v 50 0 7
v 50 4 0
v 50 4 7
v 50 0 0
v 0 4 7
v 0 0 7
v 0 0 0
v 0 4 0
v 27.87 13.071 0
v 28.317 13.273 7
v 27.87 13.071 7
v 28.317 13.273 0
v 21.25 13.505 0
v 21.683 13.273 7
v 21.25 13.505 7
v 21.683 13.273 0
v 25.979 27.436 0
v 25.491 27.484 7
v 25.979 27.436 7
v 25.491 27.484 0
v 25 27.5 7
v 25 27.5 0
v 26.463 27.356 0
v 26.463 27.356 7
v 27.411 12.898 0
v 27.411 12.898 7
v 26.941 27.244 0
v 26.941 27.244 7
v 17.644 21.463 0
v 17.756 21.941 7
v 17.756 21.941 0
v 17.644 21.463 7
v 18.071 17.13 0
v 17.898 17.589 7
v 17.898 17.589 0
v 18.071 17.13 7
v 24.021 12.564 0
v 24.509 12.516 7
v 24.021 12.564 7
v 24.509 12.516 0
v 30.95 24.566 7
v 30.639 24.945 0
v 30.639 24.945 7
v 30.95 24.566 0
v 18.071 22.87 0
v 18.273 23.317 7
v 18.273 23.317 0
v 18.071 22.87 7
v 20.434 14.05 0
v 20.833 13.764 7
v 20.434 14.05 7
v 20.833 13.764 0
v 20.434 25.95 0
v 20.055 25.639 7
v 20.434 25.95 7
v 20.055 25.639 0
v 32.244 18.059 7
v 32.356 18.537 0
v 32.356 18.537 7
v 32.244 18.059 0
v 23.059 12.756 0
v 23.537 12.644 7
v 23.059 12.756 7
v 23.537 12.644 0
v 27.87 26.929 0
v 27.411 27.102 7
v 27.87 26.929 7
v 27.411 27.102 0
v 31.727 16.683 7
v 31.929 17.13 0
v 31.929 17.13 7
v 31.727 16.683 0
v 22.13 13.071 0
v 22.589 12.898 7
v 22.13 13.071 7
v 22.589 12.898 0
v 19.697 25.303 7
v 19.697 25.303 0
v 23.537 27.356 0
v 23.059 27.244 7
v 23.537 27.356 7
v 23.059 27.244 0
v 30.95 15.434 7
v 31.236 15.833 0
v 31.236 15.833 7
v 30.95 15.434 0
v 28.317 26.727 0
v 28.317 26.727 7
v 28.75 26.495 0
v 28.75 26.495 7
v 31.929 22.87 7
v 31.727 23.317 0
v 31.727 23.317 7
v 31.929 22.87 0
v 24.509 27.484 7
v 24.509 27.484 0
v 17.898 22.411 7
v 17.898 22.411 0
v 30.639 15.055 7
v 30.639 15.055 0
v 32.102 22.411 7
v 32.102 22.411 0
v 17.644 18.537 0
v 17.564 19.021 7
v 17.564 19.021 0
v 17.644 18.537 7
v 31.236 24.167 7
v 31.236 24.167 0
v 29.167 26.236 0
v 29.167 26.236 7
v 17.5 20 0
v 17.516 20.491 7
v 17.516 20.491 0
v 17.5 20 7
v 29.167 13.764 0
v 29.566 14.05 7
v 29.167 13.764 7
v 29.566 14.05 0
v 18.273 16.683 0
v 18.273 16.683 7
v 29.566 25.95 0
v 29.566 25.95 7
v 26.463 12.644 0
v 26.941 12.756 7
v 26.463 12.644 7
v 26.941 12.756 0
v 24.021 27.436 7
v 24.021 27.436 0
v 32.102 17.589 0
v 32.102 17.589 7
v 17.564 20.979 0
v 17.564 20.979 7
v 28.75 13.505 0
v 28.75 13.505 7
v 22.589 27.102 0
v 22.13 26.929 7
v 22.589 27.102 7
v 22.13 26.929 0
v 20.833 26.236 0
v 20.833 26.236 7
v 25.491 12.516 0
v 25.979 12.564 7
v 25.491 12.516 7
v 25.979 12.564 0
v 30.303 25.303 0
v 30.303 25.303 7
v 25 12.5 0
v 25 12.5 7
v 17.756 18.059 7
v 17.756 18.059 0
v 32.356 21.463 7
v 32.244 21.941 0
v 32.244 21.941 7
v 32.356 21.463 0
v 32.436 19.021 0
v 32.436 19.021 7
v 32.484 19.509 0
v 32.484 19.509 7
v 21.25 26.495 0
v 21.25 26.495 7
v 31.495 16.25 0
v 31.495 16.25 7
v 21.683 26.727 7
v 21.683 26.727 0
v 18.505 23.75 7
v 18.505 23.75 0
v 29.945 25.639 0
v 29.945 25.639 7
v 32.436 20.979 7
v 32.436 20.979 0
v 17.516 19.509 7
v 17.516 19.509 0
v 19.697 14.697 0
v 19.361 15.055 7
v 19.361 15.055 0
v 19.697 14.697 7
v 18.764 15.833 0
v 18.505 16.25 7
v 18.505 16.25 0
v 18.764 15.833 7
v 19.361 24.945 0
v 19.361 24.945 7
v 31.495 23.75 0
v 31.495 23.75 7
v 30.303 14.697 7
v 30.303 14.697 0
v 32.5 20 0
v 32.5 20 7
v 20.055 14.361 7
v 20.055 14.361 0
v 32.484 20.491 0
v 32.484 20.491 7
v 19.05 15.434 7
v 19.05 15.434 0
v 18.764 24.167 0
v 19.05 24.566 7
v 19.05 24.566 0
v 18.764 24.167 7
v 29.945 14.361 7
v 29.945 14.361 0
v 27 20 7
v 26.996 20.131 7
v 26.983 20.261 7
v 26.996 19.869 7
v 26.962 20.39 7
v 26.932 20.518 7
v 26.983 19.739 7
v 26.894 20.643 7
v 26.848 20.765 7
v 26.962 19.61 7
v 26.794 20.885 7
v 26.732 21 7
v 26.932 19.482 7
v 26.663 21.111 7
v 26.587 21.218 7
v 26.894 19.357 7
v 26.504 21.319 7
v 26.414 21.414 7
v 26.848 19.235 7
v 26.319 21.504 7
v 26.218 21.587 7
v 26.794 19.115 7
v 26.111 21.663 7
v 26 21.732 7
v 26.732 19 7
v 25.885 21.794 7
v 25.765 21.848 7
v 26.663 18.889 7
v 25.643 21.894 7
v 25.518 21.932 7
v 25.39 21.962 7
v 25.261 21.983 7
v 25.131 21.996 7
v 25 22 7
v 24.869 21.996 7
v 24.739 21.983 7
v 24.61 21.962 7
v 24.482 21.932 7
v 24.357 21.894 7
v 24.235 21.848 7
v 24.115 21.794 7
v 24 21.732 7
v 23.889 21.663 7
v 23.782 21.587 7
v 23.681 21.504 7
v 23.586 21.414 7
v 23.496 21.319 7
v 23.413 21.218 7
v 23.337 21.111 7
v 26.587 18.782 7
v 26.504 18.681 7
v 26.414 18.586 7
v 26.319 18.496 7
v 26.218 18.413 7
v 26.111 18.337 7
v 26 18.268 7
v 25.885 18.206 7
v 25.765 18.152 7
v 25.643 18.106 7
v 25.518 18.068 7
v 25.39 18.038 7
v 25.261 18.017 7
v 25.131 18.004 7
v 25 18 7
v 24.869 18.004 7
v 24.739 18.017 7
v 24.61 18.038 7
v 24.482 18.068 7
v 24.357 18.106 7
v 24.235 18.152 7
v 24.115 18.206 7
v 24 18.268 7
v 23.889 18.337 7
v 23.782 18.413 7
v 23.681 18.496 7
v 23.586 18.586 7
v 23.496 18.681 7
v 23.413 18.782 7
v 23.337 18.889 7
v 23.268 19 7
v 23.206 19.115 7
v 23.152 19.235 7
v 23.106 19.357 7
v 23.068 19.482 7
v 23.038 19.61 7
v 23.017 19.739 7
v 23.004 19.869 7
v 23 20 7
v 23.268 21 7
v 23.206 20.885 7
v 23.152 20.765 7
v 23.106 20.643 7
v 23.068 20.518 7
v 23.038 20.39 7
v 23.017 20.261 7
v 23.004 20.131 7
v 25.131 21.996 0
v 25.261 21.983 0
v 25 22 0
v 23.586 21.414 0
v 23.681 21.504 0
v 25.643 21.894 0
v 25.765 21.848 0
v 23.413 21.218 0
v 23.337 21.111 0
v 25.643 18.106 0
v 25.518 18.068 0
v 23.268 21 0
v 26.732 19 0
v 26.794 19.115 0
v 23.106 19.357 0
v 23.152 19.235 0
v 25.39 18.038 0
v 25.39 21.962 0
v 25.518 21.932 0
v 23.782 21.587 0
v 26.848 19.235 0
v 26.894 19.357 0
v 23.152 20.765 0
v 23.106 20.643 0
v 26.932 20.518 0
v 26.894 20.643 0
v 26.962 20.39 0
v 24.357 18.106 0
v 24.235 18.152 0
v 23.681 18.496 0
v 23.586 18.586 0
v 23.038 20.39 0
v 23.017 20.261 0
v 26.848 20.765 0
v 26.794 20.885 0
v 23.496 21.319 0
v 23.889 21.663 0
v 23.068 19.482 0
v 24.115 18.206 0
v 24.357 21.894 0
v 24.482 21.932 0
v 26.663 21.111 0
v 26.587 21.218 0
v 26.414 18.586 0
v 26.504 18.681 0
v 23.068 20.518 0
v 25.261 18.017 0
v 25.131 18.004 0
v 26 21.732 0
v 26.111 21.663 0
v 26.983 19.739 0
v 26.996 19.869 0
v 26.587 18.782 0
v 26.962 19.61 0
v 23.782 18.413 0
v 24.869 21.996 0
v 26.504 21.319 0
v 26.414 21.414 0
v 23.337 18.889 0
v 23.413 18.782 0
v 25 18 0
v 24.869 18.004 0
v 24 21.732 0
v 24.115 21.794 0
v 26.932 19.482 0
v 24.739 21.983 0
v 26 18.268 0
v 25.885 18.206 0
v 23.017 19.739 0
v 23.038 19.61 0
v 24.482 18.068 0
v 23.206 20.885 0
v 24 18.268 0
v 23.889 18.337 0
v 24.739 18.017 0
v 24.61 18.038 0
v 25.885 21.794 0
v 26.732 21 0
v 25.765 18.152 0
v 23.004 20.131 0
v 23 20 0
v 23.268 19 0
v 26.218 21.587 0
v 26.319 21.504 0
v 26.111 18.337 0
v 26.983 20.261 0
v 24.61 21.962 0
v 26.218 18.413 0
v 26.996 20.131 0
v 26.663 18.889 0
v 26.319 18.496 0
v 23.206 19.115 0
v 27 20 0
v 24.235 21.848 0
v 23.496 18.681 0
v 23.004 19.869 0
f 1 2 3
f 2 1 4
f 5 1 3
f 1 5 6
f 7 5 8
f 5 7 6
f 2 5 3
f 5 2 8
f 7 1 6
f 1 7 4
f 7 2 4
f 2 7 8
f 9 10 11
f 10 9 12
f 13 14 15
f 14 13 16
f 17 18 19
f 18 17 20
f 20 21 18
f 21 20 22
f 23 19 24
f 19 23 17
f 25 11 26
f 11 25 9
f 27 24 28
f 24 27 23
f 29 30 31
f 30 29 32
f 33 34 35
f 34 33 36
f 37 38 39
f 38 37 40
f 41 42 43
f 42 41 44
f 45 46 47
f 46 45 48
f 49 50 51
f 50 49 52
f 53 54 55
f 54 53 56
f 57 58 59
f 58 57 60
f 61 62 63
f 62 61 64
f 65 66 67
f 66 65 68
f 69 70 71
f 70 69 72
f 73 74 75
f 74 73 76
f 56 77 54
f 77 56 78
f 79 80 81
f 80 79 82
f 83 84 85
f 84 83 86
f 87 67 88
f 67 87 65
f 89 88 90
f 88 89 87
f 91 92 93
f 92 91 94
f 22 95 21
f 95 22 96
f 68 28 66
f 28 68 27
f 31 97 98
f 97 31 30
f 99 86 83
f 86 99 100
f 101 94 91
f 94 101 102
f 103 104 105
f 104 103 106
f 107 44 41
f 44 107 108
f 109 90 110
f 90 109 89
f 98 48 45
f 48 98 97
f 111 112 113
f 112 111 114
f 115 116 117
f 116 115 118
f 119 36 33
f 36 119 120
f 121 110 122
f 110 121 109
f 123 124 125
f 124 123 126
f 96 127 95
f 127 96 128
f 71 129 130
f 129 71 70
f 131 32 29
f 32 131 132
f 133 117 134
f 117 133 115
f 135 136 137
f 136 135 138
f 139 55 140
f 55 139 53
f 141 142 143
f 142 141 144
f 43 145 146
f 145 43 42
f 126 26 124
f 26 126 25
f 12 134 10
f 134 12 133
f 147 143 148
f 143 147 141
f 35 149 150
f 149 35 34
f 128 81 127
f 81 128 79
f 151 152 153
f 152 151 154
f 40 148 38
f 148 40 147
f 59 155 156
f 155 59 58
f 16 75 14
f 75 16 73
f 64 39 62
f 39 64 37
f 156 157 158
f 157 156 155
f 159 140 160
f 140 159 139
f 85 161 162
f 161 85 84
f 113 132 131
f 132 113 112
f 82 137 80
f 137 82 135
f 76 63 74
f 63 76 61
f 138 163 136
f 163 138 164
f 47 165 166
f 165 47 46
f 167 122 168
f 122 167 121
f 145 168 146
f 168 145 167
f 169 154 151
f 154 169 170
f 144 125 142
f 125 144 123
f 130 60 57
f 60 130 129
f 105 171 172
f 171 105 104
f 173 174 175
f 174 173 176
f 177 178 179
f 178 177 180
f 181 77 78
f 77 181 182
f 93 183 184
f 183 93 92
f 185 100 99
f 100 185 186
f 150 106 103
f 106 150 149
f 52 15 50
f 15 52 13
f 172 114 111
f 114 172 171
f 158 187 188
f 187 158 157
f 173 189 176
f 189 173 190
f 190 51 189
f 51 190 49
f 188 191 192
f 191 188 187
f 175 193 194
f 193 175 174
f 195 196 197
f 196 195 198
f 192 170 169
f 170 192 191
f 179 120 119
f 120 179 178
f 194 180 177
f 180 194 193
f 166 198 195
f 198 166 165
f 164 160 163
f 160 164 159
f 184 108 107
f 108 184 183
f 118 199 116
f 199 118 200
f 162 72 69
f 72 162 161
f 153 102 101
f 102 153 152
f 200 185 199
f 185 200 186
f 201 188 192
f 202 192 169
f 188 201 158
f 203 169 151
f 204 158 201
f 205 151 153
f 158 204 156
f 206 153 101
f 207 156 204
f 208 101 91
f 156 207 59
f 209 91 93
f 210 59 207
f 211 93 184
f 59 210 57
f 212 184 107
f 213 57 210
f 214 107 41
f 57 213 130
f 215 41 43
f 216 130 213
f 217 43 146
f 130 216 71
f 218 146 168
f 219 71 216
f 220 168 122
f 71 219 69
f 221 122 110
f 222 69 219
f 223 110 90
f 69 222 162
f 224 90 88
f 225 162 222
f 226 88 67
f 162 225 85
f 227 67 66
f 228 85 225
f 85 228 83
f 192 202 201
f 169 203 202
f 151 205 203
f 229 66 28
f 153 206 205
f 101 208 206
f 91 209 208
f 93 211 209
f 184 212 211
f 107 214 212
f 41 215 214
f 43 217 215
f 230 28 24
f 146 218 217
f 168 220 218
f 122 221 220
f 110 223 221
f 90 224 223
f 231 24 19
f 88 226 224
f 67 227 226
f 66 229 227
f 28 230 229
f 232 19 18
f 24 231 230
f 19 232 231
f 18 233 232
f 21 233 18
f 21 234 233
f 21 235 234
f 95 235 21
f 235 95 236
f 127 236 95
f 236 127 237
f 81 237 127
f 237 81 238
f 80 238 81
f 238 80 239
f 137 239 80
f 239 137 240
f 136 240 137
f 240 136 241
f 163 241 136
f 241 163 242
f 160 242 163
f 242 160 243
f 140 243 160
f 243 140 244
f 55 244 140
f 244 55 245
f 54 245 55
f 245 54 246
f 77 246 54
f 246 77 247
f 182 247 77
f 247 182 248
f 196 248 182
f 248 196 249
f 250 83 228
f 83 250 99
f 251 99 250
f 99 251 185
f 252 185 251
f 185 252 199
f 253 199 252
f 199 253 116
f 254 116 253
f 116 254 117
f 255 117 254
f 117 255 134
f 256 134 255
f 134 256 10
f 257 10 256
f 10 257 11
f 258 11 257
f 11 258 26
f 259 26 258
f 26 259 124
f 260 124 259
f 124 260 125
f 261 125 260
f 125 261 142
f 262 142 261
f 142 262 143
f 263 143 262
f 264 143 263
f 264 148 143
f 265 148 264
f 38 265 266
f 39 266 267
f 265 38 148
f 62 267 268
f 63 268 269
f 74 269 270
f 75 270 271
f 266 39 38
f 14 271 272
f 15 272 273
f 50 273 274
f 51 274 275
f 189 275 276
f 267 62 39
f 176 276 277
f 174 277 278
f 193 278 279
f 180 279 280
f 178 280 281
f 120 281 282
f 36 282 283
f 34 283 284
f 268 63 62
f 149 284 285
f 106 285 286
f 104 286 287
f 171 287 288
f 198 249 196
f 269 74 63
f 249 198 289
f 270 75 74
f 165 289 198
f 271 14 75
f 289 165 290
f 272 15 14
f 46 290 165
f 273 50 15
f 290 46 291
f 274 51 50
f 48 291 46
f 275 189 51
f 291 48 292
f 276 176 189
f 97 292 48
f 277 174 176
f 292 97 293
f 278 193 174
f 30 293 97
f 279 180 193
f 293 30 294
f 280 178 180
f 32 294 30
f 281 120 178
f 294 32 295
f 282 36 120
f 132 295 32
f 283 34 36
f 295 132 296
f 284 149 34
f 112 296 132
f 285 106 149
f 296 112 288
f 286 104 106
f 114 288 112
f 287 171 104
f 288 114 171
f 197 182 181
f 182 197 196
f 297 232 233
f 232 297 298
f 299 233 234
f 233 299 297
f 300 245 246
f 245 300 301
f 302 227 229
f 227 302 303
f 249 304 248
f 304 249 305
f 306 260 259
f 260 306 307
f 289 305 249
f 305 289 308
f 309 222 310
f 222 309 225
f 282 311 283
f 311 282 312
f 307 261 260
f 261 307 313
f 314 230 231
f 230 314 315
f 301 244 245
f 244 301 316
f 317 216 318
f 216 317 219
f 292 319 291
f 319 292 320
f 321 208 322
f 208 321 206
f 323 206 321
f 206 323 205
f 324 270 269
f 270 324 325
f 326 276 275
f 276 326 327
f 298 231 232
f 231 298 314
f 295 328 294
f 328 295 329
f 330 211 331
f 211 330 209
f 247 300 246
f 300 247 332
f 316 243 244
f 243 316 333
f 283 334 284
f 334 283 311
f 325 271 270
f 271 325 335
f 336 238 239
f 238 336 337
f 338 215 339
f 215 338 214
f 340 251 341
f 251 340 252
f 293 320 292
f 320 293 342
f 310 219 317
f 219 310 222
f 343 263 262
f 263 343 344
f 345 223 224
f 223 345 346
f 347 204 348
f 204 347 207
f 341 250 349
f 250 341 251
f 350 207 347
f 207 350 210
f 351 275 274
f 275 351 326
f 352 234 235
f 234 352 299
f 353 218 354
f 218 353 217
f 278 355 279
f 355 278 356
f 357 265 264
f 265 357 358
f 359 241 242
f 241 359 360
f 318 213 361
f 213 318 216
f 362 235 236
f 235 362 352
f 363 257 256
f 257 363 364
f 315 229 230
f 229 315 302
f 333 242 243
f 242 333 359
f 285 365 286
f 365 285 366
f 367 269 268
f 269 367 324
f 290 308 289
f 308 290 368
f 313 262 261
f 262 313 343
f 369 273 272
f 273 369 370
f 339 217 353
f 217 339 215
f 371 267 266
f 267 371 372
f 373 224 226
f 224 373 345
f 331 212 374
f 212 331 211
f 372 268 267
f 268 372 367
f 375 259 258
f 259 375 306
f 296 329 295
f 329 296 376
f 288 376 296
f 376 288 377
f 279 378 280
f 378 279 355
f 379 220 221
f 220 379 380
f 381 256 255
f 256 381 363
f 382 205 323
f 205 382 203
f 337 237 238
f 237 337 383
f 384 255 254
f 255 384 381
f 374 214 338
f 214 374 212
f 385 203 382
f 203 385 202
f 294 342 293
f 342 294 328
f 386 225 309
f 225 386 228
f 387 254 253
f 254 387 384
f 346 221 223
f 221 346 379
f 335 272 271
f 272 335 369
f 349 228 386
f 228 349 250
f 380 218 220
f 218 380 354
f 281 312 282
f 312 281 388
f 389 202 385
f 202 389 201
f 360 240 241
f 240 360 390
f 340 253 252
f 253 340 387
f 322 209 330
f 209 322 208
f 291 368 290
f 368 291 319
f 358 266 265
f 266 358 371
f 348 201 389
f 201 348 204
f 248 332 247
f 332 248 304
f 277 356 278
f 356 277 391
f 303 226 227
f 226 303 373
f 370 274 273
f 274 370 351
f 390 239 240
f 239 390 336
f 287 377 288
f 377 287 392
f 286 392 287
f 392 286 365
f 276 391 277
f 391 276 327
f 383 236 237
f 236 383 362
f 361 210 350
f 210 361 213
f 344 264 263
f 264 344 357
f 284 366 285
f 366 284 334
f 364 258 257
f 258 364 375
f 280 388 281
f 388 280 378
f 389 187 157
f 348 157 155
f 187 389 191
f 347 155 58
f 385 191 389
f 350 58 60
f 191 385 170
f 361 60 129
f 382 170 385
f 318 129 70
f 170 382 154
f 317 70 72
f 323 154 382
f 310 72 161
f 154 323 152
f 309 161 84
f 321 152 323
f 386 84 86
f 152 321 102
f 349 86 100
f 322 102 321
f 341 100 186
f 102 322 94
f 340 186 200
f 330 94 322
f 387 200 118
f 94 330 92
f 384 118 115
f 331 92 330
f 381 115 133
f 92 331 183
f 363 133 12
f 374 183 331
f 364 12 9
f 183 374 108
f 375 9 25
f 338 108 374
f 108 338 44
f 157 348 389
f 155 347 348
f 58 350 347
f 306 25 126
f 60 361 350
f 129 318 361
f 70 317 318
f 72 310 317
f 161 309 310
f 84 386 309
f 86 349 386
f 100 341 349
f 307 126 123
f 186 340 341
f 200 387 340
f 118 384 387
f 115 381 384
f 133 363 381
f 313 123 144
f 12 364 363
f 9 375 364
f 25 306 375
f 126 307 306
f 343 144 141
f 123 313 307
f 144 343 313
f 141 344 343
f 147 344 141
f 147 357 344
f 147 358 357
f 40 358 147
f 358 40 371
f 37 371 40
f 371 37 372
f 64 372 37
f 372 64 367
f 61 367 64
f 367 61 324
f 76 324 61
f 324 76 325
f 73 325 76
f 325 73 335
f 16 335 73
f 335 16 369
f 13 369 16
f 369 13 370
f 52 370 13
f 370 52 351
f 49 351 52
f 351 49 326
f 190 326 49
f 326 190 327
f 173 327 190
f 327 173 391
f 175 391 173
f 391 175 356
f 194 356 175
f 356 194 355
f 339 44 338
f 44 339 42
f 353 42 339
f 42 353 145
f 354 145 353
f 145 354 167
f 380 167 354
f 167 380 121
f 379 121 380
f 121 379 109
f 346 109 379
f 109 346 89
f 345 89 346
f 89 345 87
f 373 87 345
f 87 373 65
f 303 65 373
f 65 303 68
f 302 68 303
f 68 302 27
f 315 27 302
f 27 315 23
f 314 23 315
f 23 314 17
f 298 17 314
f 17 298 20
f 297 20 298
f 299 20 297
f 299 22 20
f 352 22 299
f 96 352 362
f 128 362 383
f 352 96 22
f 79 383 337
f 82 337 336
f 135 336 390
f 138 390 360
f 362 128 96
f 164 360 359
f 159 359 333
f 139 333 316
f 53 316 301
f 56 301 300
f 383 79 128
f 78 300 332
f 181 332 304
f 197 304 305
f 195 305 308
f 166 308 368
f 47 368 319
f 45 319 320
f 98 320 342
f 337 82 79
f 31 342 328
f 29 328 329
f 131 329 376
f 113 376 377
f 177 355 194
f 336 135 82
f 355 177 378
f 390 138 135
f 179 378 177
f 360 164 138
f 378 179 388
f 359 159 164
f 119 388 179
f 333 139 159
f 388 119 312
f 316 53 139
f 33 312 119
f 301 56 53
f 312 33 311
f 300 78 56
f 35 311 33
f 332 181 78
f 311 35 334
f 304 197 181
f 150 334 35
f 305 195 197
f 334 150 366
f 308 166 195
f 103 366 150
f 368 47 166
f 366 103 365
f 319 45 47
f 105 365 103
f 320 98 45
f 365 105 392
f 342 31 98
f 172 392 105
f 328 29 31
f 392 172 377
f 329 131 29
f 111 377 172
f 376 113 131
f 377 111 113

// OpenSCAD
// based on work of janssen86
// http://www.thingiverse.com/thing:2072364
// Zahnstange mit Ritzel / Gear Rack and Pinion by janssen86 is licensed under the Creative Commons - Attribution - Non-Commercial - Share Alike license.
// https://creativecommons.org/licenses/by-nc-sa/3.0/

// Fake gears draw a solid rectangular prism and cylinder with axial hole, up to the pitch level, for ease of layout.
$fakeGears = true; 
herringbone = 1;
materialSavingInset = 0;
removeCircles = 0;
// Kopfspiel (pinion play)
spiel = 0.05;
// Höhe des Zahnkopfes über dem Teilkreis (height of the tooth above the pitch line)
modul=1;
// Laenge der Zahnstange
laenge_stange=50;
// Anzahl der Radzähne (number of pinion teeth)
zahnzahl_ritzel=15;
// Höhe der Zahnstange bis zur Wälzgeraden (height from bottom to the pitch line)
hoehe_stange=4; 
// Durchmesser der Mittelbohrung des Stirnrads (axial hole diameter)
bohrung_ritzel=4;
// Breite der Zähne (face width)
breite=7;
// Eingriffswinkel, Standardwert = 20° gemäß DIN 867. Sollte nicht größer als 45° sein.
eingriffswinkel=20;
// Schrägungswinkel zur Rotationsachse, Standardwert = 0° (Geradverzahnung)
schraegungswinkel=20;
// Komponenten zusammengebaut für Konstruktion oder auseinander zum 3D-Druck 
zusammen_gebaut=0;
// Löcher zur Material-/Gewichtsersparnis bzw. Oberflächenvergößerung erzeugen, wenn Geometrie erlaubt
optimiert = 1;

/* Bibliothek für ein Zahstangen-Radpaar für Thingiverse Customizer

Enthält die Module
zahnstange(modul, laenge, hoehe, breite, eingriffswinkel = 20, schraegungswinkel = 0)
stirnrad(modul, zahnzahl, breite, bohrung, eingriffswinkel = 20, schraegungswinkel = 0, optimiert = true)
zahnstange_und_ritzel (modul, laenge_stange, zahnzahl_ritzel, hoehe_stange, bohrung_ritzel, breite, eingriffswinkel=20, schraegungswinkel=0, zusammen_gebaut=true, optimiert=true)

Autor:		Dr Jörg Janssen
Stand:		6. Januar 2017
Version:	2.0
Lizenz:		Creative Commons - Attribution, Non Commercial, Share Alike

Erlaubte Module nach DIN 780:
0.05 0.06 0.08 0.10 0.12 0.16
0.20 0.25 0.3  0.4  0.5  0.6
0.7  0.8  0.9  1    1.25 1.5
2    2.5  3    4    5    6
8    10   12   16   20   25
32   40   50   60

*/


/* [Hidden] */
pi = 3.14159;
rad = 57.29578;
$fn = 96;
nudge = 0.001;

/*	Wandelt Radian in Grad um */
function grad(eingriffswinkel) =  eingriffswinkel*rad;

/*	Wandelt Grad in Radian um */
function radian(eingriffswinkel) = eingriffswinkel/rad;

/*	Wandelt 2D-Polarkoordinaten in kartesische um
    Format: radius, phi; phi = Winkel zur x-Achse auf xy-Ebene */
function pol_zu_kart(polvect) = [
	polvect[0]*cos(polvect[1]),  
	polvect[0]*sin(polvect[1])
];

/*	Kreisevolventen-Funktion:
    Gibt die Polarkoordinaten einer Kreisevolvente aus
    r = Radius des Grundkreises
    rho = Abrollwinkel in Grad */
function ev(r,rho) = [
	r/cos(rho),
	grad(tan(rho)-radian(rho))
];

/*  Wandelt Kugelkoordinaten in kartesische um
    Format: radius, theta, phi; theta = Winkel zu z-Achse, phi = Winkel zur x-Achse auf xy-Ebene */
function kugel_zu_kart(vect) = [
	vect[0]*sin(vect[1])*cos(vect[2]),  
	vect[0]*sin(vect[1])*sin(vect[2]),
	vect[0]*cos(vect[1])
];

/*	prüft, ob eine Zahl gerade ist
	= 1, wenn ja
	= 0, wenn die Zahl nicht gerade ist */
function istgerade(zahl) =
	(zahl == floor(zahl/2)*2) ? 1 : 0;

/*	Kopiert und dreht einen Körper */
module kopiere(vect, zahl, abstand, winkel){
	for(i = [0:zahl-1]){
		translate(v=vect*abstand*i)
			rotate(a=i*winkel, v = [0,0,1])
				children(0);
	}
}


/*  Zahnstange
    modul = Höhe des Zahnkopfes über der Wälzgeraden
    laenge = Laenge der Zahnstange
    hoehe = Höhe der Zahnstange bis zur Wälzgeraden
    breite = Breite der Zähne
    eingriffswinkel = Eingriffswinkel, Standardwert = 20° gemäß DIN 867. Sollte nicht größer als 45° sein.
    schraegungswinkel = Schrägungswinkel zur Zahnstangen-Querachse; 0° = Geradverzahnung */
module zahnstange(modul, laenge, hoehe, breite, eingriffswinkel = 20, schraegungswinkel = 0, $fakeGears=$fakeGears) {
    
    if ($fakeGears) {
        cube([laenge, hoehe, breite]);
    }
    else {
        // Dimensions-Berechnungen
        //modul=0.99;// modul*(1-spiel);
        c = modul / 6;												// Kopfspiel
        mx = modul/cos(schraegungswinkel);							// Durch Schrägungswinkel verzerrtes modul in x-Richtung
        a = 2*mx*tan(eingriffswinkel)+c*tan(eingriffswinkel);		// Flankenbreite
        b = pi*mx/2-2*mx*tan(eingriffswinkel);						// Kopfbreite
        x = breite*tan(schraegungswinkel);							// Verschiebung der Oberseite in x-Richtung durch Schrägungswinkel
        nz = ceil((laenge+abs(2*x))/(pi*mx));						// Anzahl der Zähne
        
        translate([-a-b/2/*-pi*mx*(floor(nz/2)-1)-a-b/2*/,hoehe-modul,0]){
            intersection(){
                kopiere([1,0,0], nz, pi*mx, 0){
                    render()
                    polyhedron(
                        points=[[0,-c,0], [a,2*modul,0], [a+b,2*modul,0], [2*a+b,-c,0], [pi*mx,-c,0], [pi*mx,modul-hoehe,0], [0,modul-hoehe,0],	// Unterseite
                            [0+x,-c,breite], [a+x,2*modul,breite], [a+b+x,2*modul,breite], [2*a+b+x,-c,breite], [pi*mx+x,-c,breite], [pi*mx+x,modul-hoehe,breite], [0+x,modul-hoehe,breite]],	// Oberseite
                        faces=[[6,5,4,3,2,1,0],						// Unterseite
                            [1,8,7,0],
                            [9,8,1,2],
                            [10,9,2,3],
                            [11,10,3,4],
                            [12,11,4,5],
                            [13,12,5,6],
                            [7,13,6,0],
                            [7,8,9,10,11,12,13],					// Oberseite
                        ]
                    );
                };
                translate([abs(x),-hoehe+modul-0.5,-0.5]){
                    cube([laenge,hoehe+modul+1,breite+1]);
                }	
            };
        };	
    }
}

function pinionPitchRadius(zahnzahl=zahnzahl_ritzel,modul=modul) = modul*zahnzahl_ritzel/2;

/*  Stirnrad
    modul = Höhe des Zahnkopfes über dem Teilkreis
    zahnzahl = Anzahl der Radzähne
    breite = Zahnbreite
    bohrung = Durchmesser der Mittelbohrung
    eingriffswinkel = Eingriffswinkel, Standardwert = 20° gemäß DIN 867. Sollte nicht größer als 45° sein.
    schraegungswinkel = Schrägungswinkel zur Rotationsachse; 0° = Geradverzahnung
	optimiert = Löcher zur Material-/Gewichtsersparnis bzw. Oberflächenvergößerung erzeugen, wenn Geometrie erlaubt (= 1, wenn wahr) */
module stirnrad(modul, zahnzahl, breite, bohrung, eingriffswinkel = 20, schraegungswinkel = 0, optimiert = true, materialSavingInset = materialSavingInset, $fakeGears=$fakeGears) {
    
    if ($fakeGears) {
        difference() {
            cylinder(r=pinionPitchRadius(zahnzahl, modul), h=breite);
            translate([0,0,-nudge]) cylinder(r=bohrung/2, h=breite+2*nudge);
        }
    }
    else {
        // Dimensions-Berechnungen	
        d = modul * zahnzahl;											// Teilkreisdurchmesser
        r = d / 2;														// Teilkreisradius
        alpha_stirn = atan(tan(eingriffswinkel)/cos(schraegungswinkel));// Schrägungswinkel im Stirnschnitt
        db = d * cos(alpha_stirn);										// Grundkreisdurchmesser
        rb = db / 2;													// Grundkreisradius
        da = (modul <1)? d + modul * 2.2 : d + modul * 2;				// Kopfkreisdurchmesser nach DIN 58400 bzw. DIN 867
        ra = da / 2;													// Kopfkreisradius
        c =  (zahnzahl <3)? 0 : modul/6;								// Kopfspiel
        df = d - 2 * (modul + c);										// Fußkreisdurchmesser
        rf = df / 2;													// Fußkreisradius
        rho_ra = acos(rb/ra);											// maximaler Abrollwinkel;
                                                                        // Evolvente beginnt auf Grundkreis und endet an Kopfkreis
        rho_r = acos(rb/r);												// Abrollwinkel am Teilkreis;
                                                                        // Evolvente beginnt auf Grundkreis und endet an Kopfkreis
        phi_r = grad(tan(rho_r)-radian(rho_r));							// Winkel zum Punkt der Evolvente auf Teilkreis
        gamma = rad*breite/(r*tan(90-schraegungswinkel));				// Torsionswinkel für Extrusion
        schritt = rho_ra/16;											// Evolvente wird in 16 Stücke geteilt
        tau = 360/zahnzahl;												// Teilungswinkel
        
        r_loch = (2*rf - bohrung)/8;									// Radius der Löcher für Material-/Gewichtsersparnis
        rm = bohrung/2+2*r_loch;										// Abstand der Achsen der Löcher von der Hauptachse
        z_loch = floor(2*pi*rm/(3*r_loch));								// Anzahl der Löcher für Material-/Gewichtsersparnis
        
        optimiert = (optimiert && r >= breite*1.5 && d > 2*bohrung);	// ist Optimierung sinnvoll?

        // Zeichnung
        union(){
            rotate([0,0,-phi_r-90*(1-spiel)/zahnzahl]){						// Zahn auf x-Achse zentrieren;
                                                                            // macht Ausrichtung mit anderen Rädern einfacher

                linear_extrude(height = breite, twist = gamma){
                    difference(){
                        union(){
                            zahnbreite = (180*(1-spiel))/zahnzahl+2*phi_r;
                            circle(rf);										// Fußkreis	
                            for (rot = [0:tau:360]){
                                rotate (rot){								// "Zahnzahl-mal" kopieren und drehen
                                    polygon(concat(							// Zahn
                                        [[0,0]],							// Zahnsegment beginnt und endet im Ursprung
                                        [for (rho = [0:schritt:rho_ra])		// von null Grad (Grundkreis)
                                                                            // bis maximalen Evolventenwinkel (Kopfkreis)
                                            pol_zu_kart(ev(rb,rho))],		// Erste Evolventen-Flanke

                                        [pol_zu_kart(ev(rb,rho_ra))],		// Punkt der Evolvente auf Kopfkreis

                                        [for (rho = [rho_ra:-schritt:0])	// von maximalen Evolventenwinkel (Kopfkreis)
                                                                            // bis null Grad (Grundkreis)
                                            pol_zu_kart([ev(rb,rho)[0], zahnbreite-ev(rb,rho)[1]])]
                                                                            // Zweite Evolventen-Flanke
                                                                            // (180*(1-spiel)) statt 180 Grad,
                                                                            // um Spiel an den Flanken zu erlauben
                                        )
                                    );
                                }
                            }
                        }			
                        circle(r = rm+r_loch*1.49);							// "Bohrung"
                    }
                }
            }
            // mit Materialersparnis
            if (optimiert) {
                linear_extrude(height = breite){
                    difference(){
                            circle(r = (bohrung+r_loch)/2);
                            circle(r = bohrung/2);							// Bohrung
                        }
                    }
                linear_extrude(height = breite-materialSavingInset){
                    difference(){
                        circle(r=rm+r_loch*1.51);
                        union(){
                            circle(r=materialSavingInset< 0 ? bohrung/2 : (bohrung+r_loch)/2);
                            if (removeCircles)
                                for (i = [0:1:z_loch]){
                                    translate(kugel_zu_kart([rm,90,i*360/z_loch]))
                                        circle(r = r_loch);
                                }
                        }
                    }
                }
            }
            // ohne Materialersparnis
            else {
                linear_extrude(height = breite){
                    difference(){
                        circle(r = rm+r_loch*1.51);
                        circle(r = bohrung/2);
                    }
                }
            }
        }
    }
}

/*	Zahnstange und Ritzel
    modul = Höhe des Zahnkopfes über dem Teilkreis
    laenge_stange = Laenge der Zahnstange
    zahnzahl_ritzel = Anzahl der Radzähne am Ritzel
	hoehe_stange = Höhe der Zahnstange bis zur Wälzgeraden
    bohrung_ritzel = Durchmesser der Mittelbohrung des Ritzels
	breite = Breite der Zähne
    eingriffswinkel = Eingriffswinkel, Standardwert = 20° gemäß DIN 867. Sollte nicht größer als 45° sein.
    schraegungswinkel = Schrägungswinkel, Standardwert = 0° (Geradverzahnung)
	optimiert = Löcher zur Material-/Gewichtsersparnis bzw. Oberflächenvergößerung erzeugen, wenn Geometrie erlaubt (= 1, wenn wahr) */
module zahnstange_und_rad (modul, laenge_stange, zahnzahl_ritzel, hoehe_stange, bohrung_ritzel, breite, eingriffswinkel=20, schraegungswinkel=0, zusammen_gebaut=true, optimiert=true, includeRack=true, includePinion=true, $fakeGears=$fakeGears) {

	abstand = zusammen_gebaut? modul*zahnzahl_ritzel/2 : modul*zahnzahl_ritzel;
	
    if (includeRack)
        zahnstange(modul, laenge_stange, hoehe_stange, breite, eingriffswinkel, -schraegungswinkel, $fakeGears=$fakeGears);
	translate([0,abstand,0])
    if (includePinion) {
		if (istgerade(zahnzahl_ritzel)) {
			rotate(90 + 180/zahnzahl_ritzel)
				stirnrad (modul, zahnzahl_ritzel, breite, bohrung_ritzel, eingriffswinkel, schraegungswinkel, optimiert, $fakeGears=$fakeGears);
		}
		else {
			rotate(a=90) 
				stirnrad (modul, zahnzahl_ritzel, breite, bohrung_ritzel, eingriffswinkel, schraegungswinkel, optimiert, $fakeGears=$fakeGears);
		}
    }
}

module doHerringbone(herringbone=herringbone, faceWidth=breite) {
    if (herringbone) {
        translate([0,0,faceWidth/2])
            union() {
                translate([0,0,-nudge]) scale([1,1,1+nudge/(faceWidth/2)]) children();
                translate([0,0,nudge]) mirror([0,0,-1]) scale([1,1,1+nudge/(faceWidth/2)]) children();
            }
        }
    else {
        children();
    }
}

module rack(faceWidth=breite, herringbone=herringbone, $fakeGears=$fakeGears) {
    doHerringbone(herringbone=herringbone, faceWidth=faceWidth) 
        render(convexity=2)
        zahnstange(modul, laenge_stange, hoehe_stange, herringbone?faceWidth/2:faceWidth, eingriffswinkel, -schraegungswinkel, $fakeGears=$fakeGears);
}

// By default in herringbone mode, this is flipped.
// The reason for that is it makes for a more
// symmetric fit when printed with the first layer
// smooshed against the print bed.
module pinion(faceWidth=breite, herringbone=herringbone, flipHerringbone=true, $fakeGears=$fakeGears) {
    module basePinion() {
        translate([0,0,materialSavingInset<0?-materialSavingInset:0])
        doHerringbone(herringbone=herringbone, faceWidth=faceWidth)
            if (istgerade(zahnzahl_ritzel)) {
                rotate(90 + 180/zahnzahl_ritzel)
                    stirnrad (modul, zahnzahl_ritzel, herringbone?faceWidth/2:faceWidth, bohrung_ritzel, eingriffswinkel, schraegungswinkel, optimiert, $fakeGears=$fakeGears);
            }
            else {
                rotate(a=90) 
                    stirnrad (modul, zahnzahl_ritzel, herringbone?faceWidth/2:faceWidth, bohrung_ritzel, eingriffswinkel, schraegungswinkel, optimiert, $fakeGears=$fakeGears);
            }
        }
        
    if (herringbone && flipHerringbone)
        mirror(0,1,0) basePinion();
    else
        basePinion();
}

render(convexity=2) {
    rack(herringbone=true, $fakeGears=$fakeGears);
    translate([laenge_stange/2,20,0]) {
    pinion(herringbone=true, $fakeGears=$fakeGears);
    }
}

//zahnstange_und_rad (modul, laenge_stange, zahnzahl_ritzel, hoehe_stange, bohrung_ritzel, breite, eingriffswinkel, schraegungswinkel, zusammen_gebaut, optimiert);
